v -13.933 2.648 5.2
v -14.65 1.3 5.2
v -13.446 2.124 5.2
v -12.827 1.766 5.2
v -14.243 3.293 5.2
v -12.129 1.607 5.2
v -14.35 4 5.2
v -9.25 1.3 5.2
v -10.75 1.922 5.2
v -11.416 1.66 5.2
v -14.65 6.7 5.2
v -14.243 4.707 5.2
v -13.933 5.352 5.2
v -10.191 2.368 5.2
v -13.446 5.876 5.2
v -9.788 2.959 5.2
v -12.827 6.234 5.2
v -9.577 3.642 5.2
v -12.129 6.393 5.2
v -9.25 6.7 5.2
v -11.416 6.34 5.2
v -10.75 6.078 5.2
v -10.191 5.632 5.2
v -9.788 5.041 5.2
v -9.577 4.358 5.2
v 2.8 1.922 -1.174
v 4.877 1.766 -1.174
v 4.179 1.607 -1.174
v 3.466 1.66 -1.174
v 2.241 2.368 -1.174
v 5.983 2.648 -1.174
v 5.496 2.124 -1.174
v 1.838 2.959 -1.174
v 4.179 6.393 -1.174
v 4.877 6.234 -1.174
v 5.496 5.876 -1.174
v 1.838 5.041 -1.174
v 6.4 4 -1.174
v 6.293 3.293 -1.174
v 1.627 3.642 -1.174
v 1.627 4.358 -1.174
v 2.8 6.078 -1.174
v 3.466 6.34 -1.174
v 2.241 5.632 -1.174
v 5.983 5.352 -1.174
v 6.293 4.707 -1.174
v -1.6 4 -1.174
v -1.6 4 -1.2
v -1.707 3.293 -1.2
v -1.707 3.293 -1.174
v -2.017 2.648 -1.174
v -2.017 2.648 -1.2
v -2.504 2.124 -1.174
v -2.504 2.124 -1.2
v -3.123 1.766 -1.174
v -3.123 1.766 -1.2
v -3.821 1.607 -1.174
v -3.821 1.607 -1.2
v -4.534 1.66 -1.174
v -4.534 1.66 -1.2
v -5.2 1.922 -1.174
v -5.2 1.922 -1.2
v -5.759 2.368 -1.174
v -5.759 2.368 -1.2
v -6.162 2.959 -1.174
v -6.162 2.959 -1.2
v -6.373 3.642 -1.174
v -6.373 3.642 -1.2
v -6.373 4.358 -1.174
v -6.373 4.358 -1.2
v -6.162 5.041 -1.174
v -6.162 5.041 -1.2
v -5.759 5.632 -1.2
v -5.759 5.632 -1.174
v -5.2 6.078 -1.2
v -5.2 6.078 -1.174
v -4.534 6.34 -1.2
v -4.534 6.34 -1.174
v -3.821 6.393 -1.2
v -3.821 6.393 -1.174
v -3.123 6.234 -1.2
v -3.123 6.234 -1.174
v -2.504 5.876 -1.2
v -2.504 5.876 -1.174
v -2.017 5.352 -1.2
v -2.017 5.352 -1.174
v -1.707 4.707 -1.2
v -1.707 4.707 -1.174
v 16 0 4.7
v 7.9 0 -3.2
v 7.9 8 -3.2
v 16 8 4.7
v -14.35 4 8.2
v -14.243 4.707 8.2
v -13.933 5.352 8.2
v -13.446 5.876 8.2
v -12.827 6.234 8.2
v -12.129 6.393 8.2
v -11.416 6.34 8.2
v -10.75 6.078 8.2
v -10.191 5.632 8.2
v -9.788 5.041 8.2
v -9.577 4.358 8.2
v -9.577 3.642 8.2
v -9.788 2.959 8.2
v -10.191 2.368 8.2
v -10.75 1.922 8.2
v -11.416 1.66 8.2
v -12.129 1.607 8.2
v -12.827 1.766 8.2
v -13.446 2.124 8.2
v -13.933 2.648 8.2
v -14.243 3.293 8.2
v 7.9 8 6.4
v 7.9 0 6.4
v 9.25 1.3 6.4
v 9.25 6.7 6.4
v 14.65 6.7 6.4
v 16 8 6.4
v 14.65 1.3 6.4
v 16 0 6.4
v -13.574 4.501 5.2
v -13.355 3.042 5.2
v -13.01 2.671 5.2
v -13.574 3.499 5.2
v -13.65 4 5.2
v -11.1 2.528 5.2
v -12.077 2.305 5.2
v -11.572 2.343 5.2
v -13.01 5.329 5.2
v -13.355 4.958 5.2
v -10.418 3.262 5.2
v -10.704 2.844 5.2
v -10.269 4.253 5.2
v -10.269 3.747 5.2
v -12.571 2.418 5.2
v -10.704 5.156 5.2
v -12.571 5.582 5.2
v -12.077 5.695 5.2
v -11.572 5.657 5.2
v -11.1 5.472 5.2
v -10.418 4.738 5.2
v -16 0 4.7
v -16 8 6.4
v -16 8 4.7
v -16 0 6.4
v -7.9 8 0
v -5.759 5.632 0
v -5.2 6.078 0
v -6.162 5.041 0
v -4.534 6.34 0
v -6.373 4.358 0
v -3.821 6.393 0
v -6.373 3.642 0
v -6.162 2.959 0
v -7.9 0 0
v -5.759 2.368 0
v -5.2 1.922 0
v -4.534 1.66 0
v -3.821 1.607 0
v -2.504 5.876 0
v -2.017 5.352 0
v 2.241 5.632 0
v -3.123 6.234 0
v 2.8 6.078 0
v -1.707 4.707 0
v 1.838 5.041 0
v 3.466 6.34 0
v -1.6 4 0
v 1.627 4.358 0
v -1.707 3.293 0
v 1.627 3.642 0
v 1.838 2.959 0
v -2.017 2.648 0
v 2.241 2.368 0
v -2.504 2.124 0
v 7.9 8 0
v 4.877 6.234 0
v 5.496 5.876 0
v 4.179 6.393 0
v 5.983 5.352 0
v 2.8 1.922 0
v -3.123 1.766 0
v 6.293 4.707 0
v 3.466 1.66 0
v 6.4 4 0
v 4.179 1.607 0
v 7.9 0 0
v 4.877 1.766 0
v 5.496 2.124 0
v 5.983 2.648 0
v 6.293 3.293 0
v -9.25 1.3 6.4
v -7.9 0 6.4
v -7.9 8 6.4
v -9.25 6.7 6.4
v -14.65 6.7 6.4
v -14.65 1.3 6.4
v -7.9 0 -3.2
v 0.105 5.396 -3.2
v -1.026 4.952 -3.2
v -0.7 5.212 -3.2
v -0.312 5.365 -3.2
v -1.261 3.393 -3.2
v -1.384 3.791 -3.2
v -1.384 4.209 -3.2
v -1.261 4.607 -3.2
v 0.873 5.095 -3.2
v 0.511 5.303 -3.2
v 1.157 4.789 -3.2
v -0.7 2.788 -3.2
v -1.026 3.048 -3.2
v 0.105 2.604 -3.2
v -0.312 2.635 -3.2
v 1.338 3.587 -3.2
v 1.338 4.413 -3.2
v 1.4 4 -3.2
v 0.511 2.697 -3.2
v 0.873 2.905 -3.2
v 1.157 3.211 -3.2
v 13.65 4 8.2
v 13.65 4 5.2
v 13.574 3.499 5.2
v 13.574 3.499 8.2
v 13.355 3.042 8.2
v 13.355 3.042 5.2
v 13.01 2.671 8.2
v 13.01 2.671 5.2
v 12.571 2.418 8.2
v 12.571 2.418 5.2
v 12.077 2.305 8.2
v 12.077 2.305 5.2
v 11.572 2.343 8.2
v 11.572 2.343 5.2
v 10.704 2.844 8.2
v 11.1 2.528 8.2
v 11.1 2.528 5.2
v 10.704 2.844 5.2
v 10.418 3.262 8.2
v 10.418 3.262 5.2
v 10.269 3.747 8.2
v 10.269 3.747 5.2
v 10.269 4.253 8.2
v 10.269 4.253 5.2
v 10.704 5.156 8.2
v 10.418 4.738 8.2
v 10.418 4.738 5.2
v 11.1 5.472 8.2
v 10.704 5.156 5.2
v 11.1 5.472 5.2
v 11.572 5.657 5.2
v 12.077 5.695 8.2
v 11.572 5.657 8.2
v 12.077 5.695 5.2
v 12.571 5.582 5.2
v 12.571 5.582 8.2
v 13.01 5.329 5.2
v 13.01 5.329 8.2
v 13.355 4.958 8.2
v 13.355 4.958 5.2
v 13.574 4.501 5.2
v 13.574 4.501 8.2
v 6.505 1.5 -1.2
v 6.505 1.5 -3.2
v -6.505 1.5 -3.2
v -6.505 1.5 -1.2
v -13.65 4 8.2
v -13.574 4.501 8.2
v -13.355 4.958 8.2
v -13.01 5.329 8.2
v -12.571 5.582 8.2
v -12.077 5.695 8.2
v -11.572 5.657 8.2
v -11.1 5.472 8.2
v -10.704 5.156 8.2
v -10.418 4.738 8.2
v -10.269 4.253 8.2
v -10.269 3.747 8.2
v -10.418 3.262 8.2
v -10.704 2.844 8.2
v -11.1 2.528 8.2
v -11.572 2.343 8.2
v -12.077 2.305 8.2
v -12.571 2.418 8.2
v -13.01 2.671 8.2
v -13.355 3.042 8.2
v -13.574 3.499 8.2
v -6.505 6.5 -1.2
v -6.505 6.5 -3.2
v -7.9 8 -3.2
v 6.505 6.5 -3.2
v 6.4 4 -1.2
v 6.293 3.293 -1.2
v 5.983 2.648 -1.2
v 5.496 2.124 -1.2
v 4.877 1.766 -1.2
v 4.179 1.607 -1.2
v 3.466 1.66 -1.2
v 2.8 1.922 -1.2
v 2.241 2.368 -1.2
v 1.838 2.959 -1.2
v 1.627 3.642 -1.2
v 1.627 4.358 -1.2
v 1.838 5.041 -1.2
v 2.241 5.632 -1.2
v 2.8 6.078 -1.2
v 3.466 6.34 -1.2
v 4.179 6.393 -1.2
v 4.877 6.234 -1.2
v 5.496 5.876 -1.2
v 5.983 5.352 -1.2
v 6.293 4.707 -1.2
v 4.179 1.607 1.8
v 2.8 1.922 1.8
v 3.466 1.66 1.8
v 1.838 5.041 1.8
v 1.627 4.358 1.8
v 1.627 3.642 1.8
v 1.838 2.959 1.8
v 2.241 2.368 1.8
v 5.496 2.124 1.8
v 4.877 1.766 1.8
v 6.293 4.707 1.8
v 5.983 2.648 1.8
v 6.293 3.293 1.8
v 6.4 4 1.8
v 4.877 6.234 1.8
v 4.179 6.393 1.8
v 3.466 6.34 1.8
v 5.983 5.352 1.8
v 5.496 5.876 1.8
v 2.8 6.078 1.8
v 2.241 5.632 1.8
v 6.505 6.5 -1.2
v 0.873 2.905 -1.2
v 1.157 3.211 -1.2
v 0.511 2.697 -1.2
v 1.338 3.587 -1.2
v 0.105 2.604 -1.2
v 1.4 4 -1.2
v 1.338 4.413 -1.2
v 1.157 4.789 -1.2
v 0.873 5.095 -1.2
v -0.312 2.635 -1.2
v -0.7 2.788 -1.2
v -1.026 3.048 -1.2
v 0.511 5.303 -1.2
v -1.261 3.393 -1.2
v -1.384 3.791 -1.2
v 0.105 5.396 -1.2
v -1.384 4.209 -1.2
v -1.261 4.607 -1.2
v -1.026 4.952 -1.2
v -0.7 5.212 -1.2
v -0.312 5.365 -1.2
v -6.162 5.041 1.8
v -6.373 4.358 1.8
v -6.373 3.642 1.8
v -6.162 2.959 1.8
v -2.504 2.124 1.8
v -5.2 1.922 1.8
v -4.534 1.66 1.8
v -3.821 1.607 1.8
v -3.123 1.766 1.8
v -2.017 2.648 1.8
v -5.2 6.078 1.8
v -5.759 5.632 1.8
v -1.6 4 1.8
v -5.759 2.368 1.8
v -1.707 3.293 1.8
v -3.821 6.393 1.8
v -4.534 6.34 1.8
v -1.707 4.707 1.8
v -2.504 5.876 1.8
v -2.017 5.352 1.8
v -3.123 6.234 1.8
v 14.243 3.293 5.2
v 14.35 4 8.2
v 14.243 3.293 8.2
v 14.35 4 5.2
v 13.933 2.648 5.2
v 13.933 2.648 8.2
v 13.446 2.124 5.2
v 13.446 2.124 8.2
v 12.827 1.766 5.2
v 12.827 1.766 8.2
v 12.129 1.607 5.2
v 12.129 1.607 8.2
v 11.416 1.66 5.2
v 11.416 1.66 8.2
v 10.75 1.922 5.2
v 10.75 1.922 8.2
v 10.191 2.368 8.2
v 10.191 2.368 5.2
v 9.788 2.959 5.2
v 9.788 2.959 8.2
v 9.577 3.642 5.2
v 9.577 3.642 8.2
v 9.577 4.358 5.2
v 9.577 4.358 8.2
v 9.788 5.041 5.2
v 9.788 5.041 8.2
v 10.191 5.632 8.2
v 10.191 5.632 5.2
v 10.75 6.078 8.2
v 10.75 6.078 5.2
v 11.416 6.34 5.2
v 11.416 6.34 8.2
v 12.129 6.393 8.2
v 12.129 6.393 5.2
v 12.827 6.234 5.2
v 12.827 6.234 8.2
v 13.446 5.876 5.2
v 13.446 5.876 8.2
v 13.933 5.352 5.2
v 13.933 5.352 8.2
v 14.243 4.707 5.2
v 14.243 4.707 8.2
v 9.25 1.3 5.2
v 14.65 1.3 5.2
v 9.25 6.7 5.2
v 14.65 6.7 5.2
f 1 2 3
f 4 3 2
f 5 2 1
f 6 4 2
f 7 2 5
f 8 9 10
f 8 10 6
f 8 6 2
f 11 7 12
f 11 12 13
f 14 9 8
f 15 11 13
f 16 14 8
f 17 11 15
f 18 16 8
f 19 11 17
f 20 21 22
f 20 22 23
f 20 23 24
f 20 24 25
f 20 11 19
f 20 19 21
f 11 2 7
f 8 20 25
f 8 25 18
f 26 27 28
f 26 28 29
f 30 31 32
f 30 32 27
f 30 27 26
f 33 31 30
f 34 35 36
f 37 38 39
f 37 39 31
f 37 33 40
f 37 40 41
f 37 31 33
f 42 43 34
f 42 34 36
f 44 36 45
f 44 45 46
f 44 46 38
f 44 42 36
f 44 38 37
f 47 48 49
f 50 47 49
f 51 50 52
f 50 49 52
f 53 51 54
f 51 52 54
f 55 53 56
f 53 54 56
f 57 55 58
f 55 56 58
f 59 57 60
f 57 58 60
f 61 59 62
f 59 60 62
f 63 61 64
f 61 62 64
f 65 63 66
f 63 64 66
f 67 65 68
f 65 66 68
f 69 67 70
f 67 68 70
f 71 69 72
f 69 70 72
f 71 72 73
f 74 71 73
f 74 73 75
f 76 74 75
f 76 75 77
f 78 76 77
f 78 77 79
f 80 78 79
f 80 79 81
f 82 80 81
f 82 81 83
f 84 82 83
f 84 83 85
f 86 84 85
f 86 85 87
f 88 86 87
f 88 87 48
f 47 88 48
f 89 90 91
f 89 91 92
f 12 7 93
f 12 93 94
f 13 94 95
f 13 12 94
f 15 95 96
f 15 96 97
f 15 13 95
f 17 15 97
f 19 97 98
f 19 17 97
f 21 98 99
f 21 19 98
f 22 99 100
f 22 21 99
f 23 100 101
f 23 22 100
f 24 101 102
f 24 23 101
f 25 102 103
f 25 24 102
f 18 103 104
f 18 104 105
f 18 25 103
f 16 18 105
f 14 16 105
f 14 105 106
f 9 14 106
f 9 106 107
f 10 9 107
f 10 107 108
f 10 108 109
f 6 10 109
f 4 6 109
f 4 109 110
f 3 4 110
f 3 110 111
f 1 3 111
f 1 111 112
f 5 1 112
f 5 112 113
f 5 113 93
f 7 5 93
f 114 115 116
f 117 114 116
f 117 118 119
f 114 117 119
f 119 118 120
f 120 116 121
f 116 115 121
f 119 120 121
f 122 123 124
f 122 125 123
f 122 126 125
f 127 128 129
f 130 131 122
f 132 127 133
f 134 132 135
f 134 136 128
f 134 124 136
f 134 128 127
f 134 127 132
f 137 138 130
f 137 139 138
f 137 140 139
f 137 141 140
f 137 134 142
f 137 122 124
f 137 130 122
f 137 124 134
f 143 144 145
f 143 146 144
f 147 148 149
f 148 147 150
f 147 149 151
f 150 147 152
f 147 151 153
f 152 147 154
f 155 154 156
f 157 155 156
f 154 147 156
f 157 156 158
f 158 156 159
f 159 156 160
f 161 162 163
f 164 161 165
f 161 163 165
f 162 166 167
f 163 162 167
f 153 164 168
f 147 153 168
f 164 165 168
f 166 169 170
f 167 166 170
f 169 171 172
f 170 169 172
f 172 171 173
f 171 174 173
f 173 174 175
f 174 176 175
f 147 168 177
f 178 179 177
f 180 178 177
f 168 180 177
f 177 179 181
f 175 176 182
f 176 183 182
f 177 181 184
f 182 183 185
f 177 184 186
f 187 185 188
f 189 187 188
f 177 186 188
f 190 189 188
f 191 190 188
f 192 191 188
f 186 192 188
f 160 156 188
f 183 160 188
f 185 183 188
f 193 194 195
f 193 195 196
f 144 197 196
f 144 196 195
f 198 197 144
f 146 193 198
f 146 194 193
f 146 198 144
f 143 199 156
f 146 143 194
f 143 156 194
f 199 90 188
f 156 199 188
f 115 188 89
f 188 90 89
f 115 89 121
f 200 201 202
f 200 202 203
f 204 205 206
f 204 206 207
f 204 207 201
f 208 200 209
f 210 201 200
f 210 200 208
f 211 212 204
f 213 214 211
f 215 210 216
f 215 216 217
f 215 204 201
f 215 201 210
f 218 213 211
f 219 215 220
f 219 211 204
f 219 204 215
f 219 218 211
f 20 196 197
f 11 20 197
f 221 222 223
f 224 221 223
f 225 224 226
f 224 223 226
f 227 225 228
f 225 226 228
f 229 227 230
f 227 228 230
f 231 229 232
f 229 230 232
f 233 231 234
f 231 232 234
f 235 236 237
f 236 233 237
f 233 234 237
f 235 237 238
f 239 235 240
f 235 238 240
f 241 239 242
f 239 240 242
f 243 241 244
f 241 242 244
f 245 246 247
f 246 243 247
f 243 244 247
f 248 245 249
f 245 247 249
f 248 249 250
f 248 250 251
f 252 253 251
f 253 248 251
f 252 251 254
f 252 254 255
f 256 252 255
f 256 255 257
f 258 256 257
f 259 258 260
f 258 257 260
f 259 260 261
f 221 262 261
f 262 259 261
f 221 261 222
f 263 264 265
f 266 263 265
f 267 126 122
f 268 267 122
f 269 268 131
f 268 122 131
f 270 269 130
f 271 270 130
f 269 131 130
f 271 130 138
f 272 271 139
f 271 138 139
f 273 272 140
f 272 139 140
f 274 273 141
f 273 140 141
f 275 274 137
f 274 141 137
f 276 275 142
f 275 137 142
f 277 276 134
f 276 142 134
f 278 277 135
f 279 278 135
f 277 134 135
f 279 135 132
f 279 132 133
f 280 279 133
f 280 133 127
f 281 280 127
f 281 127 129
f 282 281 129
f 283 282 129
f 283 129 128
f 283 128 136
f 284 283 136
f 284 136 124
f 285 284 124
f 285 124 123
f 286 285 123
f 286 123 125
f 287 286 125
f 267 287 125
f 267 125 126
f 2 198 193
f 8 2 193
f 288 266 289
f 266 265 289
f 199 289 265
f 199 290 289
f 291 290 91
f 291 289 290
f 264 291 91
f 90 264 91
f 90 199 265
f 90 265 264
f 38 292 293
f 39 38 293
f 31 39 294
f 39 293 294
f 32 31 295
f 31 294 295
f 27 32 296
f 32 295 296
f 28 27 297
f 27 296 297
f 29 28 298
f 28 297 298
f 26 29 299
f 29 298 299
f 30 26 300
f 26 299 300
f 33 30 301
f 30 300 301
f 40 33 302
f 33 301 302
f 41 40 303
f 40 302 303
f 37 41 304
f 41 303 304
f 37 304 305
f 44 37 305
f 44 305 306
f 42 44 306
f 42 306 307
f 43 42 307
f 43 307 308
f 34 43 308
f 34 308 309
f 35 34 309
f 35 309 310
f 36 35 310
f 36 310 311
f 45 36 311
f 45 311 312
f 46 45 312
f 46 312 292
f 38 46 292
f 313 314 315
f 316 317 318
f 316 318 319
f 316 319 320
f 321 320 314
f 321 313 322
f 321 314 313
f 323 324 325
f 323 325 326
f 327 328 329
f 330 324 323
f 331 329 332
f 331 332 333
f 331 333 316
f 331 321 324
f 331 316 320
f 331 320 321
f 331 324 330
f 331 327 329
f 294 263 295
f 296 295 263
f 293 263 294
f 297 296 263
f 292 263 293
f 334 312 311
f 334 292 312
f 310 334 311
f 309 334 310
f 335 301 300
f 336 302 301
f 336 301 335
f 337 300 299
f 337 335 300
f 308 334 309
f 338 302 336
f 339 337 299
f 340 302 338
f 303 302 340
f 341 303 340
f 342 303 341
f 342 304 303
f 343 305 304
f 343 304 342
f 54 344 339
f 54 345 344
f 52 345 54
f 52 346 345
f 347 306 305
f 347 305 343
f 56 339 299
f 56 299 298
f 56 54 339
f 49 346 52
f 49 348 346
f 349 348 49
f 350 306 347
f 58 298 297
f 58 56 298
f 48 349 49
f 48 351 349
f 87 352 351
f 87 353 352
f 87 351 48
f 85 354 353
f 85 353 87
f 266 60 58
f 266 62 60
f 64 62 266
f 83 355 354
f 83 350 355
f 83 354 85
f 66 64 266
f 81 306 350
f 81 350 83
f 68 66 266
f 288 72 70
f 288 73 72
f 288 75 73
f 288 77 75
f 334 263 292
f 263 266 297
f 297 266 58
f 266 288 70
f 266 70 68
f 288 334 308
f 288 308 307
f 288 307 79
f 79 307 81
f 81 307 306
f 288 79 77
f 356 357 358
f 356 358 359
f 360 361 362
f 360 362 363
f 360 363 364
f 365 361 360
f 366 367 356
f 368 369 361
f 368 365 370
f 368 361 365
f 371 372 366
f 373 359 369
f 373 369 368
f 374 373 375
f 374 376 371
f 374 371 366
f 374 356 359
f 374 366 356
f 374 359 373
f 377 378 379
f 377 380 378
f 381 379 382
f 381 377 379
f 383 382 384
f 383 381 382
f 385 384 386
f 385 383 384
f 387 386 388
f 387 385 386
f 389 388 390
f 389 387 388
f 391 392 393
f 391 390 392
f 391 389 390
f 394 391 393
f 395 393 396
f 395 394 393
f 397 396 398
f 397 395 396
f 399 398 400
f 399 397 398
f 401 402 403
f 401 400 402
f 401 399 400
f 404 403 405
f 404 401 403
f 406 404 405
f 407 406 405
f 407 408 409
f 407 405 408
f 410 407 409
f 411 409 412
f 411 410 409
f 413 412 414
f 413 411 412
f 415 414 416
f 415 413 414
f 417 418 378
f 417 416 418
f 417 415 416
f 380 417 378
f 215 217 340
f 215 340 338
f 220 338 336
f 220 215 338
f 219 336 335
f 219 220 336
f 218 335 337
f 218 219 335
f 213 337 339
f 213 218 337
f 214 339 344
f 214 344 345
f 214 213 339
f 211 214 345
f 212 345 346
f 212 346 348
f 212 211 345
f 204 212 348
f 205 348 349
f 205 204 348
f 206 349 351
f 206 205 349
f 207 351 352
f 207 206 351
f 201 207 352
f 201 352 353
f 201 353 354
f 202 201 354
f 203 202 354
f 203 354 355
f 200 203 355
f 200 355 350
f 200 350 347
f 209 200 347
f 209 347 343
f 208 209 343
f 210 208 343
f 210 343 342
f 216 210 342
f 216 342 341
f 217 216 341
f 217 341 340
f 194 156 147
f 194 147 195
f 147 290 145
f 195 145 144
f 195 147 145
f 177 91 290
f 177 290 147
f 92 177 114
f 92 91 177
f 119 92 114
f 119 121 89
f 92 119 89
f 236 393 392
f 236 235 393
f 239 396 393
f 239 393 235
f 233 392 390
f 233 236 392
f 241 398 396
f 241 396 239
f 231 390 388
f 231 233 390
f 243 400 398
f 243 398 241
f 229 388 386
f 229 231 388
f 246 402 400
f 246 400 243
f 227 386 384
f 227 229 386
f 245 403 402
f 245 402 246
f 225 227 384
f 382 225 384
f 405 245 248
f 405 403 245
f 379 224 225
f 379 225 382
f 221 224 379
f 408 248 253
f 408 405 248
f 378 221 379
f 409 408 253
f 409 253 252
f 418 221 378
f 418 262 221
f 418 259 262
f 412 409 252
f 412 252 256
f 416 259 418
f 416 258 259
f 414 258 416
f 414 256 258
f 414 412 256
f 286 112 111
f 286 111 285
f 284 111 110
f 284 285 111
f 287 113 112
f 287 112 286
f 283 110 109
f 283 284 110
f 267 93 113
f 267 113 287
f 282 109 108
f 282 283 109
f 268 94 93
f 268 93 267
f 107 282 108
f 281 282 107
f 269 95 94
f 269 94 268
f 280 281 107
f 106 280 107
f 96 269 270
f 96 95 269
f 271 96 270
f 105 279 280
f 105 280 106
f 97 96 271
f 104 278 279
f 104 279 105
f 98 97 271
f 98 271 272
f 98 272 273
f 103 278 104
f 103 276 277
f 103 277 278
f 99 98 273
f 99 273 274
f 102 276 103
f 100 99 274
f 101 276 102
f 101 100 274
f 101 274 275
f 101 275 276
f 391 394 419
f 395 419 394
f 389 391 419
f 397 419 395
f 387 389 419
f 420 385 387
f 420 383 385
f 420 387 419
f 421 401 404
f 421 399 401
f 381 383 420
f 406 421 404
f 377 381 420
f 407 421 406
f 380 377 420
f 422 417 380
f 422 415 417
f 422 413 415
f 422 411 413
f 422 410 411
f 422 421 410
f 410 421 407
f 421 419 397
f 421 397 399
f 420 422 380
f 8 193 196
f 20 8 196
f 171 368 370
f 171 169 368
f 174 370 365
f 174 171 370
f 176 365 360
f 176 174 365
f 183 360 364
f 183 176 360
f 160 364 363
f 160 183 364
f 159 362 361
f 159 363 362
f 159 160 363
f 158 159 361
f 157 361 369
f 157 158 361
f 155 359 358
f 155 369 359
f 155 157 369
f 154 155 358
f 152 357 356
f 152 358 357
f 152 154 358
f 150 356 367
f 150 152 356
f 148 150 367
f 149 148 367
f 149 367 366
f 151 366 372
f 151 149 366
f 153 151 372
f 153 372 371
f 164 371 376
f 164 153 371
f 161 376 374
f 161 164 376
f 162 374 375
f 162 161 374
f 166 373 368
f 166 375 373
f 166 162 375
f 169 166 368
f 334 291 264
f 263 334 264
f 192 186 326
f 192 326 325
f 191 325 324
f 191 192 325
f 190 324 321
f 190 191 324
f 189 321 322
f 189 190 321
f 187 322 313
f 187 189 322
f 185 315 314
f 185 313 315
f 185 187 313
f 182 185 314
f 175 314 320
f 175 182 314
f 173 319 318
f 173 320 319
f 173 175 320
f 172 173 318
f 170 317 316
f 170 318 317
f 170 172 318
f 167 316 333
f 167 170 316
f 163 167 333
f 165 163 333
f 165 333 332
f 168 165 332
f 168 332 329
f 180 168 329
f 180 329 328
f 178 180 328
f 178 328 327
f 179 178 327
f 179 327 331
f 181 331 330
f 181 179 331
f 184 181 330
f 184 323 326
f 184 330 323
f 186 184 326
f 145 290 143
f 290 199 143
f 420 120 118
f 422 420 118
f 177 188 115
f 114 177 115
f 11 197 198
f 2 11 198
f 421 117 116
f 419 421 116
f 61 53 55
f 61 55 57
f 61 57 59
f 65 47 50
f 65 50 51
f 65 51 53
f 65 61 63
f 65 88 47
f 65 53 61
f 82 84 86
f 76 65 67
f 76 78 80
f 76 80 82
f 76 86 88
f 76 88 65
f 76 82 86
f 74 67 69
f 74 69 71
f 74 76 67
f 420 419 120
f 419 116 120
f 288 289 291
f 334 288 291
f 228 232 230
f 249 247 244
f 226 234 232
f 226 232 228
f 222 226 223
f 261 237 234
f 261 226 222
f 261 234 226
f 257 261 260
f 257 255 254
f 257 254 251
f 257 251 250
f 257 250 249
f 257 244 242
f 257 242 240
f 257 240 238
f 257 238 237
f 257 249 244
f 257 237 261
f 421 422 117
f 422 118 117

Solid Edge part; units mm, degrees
sketch "Sketch1" plane through (0, 0, 0) normal (0, -1, 0) x (1, 0, 0)
  line L0 (-7.9, 0) -> (7.9, 0)
  line L1 (7.9, 0) -> (7.9, 6.4)
  line L2 (7.9, 6.4) -> (16, 6.4)
  line L3 (16, 6.4) -> (16, 4.7)
  line L4 (7.9, -3.2) -> (16, 4.7)
  line L5 (-7.9, -3.2) -> (7.9, -3.2)
  line L6 (-7.9, -3.2) -> (-16, 4.7)
  line L7 (-16, 6.4) -> (-16, 4.7)
  line L8 (-7.9, 6.4) -> (-16, 6.4)
  line L9 (-7.9, 0) -> (-7.9, 6.4)
  dimension "D1" = 15.8
  dimension "D2" = 6.4
  dimension "D3" = 8.1
  dimension "D4" = 1.7
  dimension "D5" = 15.8
  dimension "D6" = 8.1
extrude "Protrusion1" add sketch "Sketch1" against normal blind 8
sketch "Sketch2" plane through (11.95, 4, 6.4) normal (0, 0, 1) x (1, 0, 0)
  line L0 (-2.7, -2.7) -> (2.7, -2.7)
  line L1 (2.7, -2.7) -> (2.7, 2.7)
  line L2 (2.7, 2.7) -> (-2.7, 2.7)
  line L3 (-2.7, 2.7) -> (-2.7, -2.7)
  dimension "D1" = 5.4
  dimension "D2" = 5.4
extrude "ExtrudedCutout_1" cut sketch "Sketch2" against normal blind 1.2
sketch "Sketch3" plane through (0, 4, 0) normal (0, 0, 1) x (1, 0, 0)
  circle A0 centre (-4, 0) radius 2.4
  circle A1 centre (4, 0) radius 2.4
extrude "ExtrudedProtrusion_2" add sketch "Sketch3" along normal blind 1.8
sketch "Sketch4" plane through (11.95, 4, 5.2) normal (0, 0, 1) x (1, 0, 0)
  circle A0 centre (0, 0) radius 2.4
  circle A1 centre (0, 0) radius 1.7
  dimension "D1" = 4.8
  dimension "D2" = 3.4
extrude "ExtrudedProtrusion_3" add sketch "Sketch4" along normal blind 3
mirror "Mirror1" about plane through (0, 0, 0) normal (1, 0, 0) of "ExtrudedCutout_1"
mirror "Mirror2" about plane through (0, 0, 0) normal (1, 0, 0) of "ExtrudedProtrusion_3"
sketch "Sketch5" plane through (0, 4, -3.2) normal (0, 0, -1) x (1, 0, 0)
  line L0 (-6.505, -2.5) -> (6.505, -2.5)
  line L1 (6.505, -2.5) -> (6.505, 2.5)
  line L2 (6.505, 2.5) -> (-6.505, 2.5)
  line L3 (-6.505, 2.5) -> (-6.505, -2.5)
  circle A0 centre (0, 0) radius 1.4
extrude "ExtrudedCutout_3" cut sketch "Sketch5" against normal blind 2
sketch "Sketch6" plane through (0, 4, -1.2) normal (0, 0, -1) x (1, 0, 0)
  circle A0 centre (-4, 0) radius 2.4
  circle A1 centre (4, 0) radius 2.4
extrude "ExtrudedCutout_4" cut sketch "Sketch6" against normal blind 0.0255
